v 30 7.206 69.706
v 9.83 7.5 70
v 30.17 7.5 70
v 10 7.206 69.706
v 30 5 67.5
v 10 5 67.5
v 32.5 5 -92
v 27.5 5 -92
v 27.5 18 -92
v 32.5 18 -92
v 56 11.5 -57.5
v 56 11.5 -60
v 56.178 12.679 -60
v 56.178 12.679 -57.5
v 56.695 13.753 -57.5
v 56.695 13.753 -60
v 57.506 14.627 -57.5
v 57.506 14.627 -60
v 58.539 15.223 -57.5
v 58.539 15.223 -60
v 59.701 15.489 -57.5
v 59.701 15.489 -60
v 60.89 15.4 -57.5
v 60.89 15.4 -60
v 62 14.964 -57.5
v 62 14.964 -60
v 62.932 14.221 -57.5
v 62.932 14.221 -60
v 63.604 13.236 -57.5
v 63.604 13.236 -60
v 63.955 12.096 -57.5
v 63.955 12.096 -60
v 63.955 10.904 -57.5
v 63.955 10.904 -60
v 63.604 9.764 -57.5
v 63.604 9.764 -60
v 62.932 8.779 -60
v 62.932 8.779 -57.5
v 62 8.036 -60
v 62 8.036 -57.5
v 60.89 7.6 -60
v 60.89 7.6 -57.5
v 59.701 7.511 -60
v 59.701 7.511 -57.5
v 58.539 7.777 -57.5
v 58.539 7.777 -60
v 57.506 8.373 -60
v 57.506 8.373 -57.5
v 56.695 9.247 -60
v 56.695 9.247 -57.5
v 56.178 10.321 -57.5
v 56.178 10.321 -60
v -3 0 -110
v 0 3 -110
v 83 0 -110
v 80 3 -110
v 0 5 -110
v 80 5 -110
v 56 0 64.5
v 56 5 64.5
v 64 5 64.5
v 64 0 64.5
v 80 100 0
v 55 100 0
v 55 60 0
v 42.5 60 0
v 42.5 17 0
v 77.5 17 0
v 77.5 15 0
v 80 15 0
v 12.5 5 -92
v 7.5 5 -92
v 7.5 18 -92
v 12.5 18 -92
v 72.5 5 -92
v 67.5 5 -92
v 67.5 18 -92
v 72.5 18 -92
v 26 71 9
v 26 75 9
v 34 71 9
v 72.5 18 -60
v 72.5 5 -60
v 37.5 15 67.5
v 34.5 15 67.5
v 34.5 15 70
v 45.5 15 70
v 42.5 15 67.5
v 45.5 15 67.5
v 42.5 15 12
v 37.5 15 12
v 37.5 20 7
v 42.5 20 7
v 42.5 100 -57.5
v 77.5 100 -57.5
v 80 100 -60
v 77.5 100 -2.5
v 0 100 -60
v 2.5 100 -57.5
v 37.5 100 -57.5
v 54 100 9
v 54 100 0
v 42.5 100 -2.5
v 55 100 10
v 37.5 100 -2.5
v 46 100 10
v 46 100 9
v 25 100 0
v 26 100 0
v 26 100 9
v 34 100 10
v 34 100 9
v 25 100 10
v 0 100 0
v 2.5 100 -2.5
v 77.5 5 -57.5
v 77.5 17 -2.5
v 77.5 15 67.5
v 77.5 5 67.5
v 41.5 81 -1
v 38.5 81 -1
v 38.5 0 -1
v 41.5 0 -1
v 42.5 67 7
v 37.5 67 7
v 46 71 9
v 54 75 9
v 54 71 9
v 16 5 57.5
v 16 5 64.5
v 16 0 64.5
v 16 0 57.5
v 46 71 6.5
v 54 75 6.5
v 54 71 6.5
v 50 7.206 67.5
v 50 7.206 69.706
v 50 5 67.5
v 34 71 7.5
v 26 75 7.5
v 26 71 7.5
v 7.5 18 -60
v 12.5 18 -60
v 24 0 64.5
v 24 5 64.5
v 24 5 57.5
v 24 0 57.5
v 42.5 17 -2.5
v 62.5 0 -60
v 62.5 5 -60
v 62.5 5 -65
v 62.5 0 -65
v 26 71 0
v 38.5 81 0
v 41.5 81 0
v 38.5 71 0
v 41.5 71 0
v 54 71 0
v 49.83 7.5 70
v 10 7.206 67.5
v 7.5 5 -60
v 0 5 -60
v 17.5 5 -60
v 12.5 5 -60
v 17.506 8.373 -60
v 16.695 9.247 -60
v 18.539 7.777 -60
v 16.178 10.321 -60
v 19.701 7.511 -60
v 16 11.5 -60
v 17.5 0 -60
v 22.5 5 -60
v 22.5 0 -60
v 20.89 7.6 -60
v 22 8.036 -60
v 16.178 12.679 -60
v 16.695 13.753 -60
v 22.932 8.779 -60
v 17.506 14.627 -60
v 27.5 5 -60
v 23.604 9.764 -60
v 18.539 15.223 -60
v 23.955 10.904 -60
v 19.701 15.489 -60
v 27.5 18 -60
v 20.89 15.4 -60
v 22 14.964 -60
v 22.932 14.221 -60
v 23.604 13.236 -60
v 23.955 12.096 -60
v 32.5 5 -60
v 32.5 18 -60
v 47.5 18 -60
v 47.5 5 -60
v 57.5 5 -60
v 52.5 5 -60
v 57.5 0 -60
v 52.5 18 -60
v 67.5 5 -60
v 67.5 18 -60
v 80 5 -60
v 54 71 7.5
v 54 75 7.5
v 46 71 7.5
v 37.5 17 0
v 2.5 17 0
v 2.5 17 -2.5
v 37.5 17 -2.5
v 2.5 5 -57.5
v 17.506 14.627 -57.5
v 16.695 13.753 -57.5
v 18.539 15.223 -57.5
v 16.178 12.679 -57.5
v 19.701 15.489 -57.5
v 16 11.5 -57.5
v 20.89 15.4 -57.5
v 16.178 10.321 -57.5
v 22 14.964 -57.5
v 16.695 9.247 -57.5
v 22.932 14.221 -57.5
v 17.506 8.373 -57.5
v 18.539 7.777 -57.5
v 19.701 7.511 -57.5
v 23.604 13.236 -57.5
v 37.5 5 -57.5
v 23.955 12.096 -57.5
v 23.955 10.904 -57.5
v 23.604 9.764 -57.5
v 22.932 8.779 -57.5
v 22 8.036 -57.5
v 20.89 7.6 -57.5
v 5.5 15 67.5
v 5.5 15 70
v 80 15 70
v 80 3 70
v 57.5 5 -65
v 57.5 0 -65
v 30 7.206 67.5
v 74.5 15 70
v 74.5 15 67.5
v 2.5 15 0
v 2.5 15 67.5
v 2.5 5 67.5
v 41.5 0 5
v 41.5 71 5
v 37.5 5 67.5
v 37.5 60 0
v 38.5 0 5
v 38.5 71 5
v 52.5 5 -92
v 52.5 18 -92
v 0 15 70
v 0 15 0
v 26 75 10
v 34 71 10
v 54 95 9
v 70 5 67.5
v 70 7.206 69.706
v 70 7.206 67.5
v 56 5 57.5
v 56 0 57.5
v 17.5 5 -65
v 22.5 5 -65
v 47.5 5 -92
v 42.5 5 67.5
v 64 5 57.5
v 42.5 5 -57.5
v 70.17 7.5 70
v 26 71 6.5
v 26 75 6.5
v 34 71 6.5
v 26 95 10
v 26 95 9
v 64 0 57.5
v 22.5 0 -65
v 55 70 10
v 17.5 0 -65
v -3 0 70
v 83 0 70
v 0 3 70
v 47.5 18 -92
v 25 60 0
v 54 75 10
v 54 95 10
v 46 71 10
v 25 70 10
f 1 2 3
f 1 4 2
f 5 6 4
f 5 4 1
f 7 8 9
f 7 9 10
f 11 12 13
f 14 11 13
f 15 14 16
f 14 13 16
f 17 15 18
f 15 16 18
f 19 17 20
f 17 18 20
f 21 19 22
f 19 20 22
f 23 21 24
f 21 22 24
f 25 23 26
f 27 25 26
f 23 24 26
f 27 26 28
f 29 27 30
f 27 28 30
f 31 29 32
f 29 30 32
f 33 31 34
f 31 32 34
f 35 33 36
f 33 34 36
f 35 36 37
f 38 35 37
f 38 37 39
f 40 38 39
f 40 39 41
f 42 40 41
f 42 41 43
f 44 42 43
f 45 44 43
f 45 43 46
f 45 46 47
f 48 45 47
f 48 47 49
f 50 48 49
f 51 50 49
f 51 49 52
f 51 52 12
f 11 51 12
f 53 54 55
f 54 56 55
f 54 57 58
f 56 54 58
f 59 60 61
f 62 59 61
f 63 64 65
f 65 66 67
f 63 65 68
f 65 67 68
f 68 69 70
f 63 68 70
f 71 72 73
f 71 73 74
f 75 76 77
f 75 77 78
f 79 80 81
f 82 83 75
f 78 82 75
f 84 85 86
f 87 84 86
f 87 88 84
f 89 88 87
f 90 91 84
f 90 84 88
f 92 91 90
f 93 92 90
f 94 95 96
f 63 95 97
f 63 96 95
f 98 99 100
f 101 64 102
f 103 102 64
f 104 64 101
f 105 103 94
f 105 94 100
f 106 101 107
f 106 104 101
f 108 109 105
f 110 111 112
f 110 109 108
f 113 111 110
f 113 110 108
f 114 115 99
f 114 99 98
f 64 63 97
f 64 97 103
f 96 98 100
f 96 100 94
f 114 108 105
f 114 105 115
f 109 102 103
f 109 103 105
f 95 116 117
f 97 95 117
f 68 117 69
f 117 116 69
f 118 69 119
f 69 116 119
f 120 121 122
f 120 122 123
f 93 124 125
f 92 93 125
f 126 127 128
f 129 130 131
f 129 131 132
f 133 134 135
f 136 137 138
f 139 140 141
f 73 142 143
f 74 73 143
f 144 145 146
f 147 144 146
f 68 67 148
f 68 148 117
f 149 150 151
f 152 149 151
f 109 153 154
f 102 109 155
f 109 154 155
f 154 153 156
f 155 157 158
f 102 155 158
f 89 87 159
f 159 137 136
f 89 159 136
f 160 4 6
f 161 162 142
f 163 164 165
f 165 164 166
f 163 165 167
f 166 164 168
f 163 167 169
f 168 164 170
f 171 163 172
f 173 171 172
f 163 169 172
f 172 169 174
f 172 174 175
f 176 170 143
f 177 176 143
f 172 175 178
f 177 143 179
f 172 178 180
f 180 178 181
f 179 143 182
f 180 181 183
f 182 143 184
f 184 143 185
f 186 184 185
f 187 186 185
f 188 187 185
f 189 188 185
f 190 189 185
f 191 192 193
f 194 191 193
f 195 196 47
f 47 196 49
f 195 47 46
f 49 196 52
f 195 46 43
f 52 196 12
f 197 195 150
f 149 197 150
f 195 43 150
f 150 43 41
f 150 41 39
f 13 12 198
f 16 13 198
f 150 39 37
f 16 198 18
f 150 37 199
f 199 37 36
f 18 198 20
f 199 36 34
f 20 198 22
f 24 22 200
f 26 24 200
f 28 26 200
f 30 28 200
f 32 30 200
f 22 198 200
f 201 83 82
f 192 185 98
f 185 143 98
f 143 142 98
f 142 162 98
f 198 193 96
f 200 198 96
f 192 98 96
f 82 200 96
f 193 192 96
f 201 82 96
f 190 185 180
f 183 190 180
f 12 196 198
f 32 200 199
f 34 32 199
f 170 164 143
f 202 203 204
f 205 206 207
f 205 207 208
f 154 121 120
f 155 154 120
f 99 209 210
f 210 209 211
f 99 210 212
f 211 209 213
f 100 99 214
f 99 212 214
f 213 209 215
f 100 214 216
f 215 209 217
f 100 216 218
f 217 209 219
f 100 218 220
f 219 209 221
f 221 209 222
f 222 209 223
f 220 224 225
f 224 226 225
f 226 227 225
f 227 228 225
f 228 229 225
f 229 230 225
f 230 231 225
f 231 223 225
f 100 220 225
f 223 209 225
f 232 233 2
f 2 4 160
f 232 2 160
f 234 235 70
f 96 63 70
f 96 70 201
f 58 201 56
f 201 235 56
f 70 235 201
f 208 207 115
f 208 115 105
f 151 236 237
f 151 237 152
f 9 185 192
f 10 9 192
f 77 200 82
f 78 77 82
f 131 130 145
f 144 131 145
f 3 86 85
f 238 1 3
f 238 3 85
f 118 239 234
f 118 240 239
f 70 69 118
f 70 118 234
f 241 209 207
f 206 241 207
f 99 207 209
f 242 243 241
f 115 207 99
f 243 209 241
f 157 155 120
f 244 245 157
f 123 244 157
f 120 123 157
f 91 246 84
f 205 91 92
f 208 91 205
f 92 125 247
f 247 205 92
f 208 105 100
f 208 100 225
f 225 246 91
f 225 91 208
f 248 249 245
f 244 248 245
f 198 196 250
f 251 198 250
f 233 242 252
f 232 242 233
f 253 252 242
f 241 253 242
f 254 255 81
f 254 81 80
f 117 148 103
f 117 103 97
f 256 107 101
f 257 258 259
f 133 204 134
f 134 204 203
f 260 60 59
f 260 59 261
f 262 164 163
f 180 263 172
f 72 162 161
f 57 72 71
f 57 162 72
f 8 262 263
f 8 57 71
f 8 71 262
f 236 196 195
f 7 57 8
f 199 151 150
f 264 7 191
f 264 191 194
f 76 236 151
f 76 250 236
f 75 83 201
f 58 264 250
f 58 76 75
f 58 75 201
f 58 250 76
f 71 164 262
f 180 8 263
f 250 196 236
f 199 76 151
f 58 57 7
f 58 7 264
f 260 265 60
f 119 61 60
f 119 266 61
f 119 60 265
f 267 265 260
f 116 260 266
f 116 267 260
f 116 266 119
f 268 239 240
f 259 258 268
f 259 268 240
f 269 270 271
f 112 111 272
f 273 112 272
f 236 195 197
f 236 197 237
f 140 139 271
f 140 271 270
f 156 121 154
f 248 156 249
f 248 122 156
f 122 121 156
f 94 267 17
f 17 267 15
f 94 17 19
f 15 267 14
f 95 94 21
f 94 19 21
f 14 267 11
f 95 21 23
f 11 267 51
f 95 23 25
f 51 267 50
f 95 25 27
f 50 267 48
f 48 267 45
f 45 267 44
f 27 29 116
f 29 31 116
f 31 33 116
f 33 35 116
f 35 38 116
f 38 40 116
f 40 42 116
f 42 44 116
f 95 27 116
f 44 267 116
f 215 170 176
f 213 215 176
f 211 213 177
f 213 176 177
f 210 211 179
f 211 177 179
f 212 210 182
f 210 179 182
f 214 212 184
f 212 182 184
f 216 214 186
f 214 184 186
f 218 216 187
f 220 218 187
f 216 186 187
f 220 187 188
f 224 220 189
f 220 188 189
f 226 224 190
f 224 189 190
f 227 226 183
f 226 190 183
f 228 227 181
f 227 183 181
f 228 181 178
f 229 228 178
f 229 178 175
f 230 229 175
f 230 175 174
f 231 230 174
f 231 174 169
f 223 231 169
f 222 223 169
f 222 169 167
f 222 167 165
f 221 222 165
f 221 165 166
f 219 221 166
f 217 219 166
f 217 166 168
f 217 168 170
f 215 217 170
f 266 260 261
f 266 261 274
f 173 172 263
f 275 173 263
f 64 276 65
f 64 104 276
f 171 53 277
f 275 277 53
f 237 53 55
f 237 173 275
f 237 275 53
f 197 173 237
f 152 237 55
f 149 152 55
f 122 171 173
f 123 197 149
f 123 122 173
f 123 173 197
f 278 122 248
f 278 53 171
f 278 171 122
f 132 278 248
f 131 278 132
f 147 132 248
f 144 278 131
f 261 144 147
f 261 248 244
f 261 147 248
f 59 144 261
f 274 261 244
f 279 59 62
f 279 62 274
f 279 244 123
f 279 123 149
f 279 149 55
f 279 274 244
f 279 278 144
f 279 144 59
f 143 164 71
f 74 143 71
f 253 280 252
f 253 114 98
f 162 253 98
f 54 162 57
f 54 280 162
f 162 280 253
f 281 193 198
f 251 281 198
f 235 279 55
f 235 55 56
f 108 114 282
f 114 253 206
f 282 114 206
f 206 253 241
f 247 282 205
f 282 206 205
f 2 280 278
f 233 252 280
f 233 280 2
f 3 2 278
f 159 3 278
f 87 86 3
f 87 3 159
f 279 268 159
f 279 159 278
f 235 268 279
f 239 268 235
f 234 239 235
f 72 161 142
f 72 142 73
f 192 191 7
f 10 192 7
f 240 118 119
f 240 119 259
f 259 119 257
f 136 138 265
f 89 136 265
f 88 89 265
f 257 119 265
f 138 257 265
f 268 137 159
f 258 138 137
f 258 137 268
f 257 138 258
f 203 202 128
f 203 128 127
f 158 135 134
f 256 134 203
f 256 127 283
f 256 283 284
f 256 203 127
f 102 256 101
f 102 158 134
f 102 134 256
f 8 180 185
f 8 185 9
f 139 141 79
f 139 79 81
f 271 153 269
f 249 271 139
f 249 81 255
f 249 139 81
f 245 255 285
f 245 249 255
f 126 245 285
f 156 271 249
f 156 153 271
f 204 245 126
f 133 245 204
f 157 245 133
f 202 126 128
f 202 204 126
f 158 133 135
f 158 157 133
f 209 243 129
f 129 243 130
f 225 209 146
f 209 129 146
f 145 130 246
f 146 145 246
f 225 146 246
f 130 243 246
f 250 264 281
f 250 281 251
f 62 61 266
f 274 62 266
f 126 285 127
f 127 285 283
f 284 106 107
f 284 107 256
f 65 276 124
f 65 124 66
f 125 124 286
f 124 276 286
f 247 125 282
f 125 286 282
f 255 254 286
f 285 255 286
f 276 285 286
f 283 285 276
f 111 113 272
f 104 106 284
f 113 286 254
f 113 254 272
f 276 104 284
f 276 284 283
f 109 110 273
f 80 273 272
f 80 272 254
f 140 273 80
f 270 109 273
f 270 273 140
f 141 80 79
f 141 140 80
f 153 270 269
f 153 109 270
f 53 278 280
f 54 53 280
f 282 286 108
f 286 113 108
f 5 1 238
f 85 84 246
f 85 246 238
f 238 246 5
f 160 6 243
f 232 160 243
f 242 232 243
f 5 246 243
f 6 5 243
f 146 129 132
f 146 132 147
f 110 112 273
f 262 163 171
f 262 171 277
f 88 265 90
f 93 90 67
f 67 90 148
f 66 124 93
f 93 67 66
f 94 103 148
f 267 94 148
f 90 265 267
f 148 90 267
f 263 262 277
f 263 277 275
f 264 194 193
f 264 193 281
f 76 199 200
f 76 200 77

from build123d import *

# Parameters (mm, degrees)
SKETCH1_W                                 = 80
SKETCH1_H                                 = 60
BOSS_EXTRUDE1_DEPTH                       = 100
CUT_EXTRUDE1_START                        = 5
SKETCH2_W                                 = 35
SKETCH2_H                                 = 55
CUT_EXTRUDE1_DEPTH                        = 95
SKETCH3_W                                 = 80
SKETCH3_H                                 = 5
BOSS_EXTRUDE2_DEPTH                       = 70
BOSS_EXTRUDE3_DEPTH                       = 10
SKETCH5_W                                 = 20
SKETCH5_H                                 = 2.5
CUT_EXTRUDE2_DEPTH                        = 7.5
SKETCH6_W                                 = 35
SKETCH6_H                                 = 12
CUT_EXTRUDE4_DEPTH                        = 57.5
CUT_EXTRUDE6_REACH                        = 184.483
SKETCH7_R                                 = 4
SKETCH9_W                                 = 80
SKETCH9_H                                 = 50
BOSS_EXTRUDE4_DEPTH                       = 5
SKETCH13_W                                = 8
SKETCH13_H                                = 7
CUT_EXTRUDE8_BUTTON_HOLES_DEPTH           = 166.90660023
BOSS_EXTRUDE5_OLED_MOUNT_DEPTH            = 10
BOSS_EXTRUDE6_OLED_MOUNT_DEPTH            = 1
BOSS_EXTRUDE7_START                       = -2.5
BOSS_EXTRUDE7_OLED_MOUNT_DEPTH            = 1
BOSS_EXTRUDE8_OLED_MOUNT_DEPTH            = 1
BOSS_EXTRUDE13_OLED_MOUNT_SUPPORT_DEPTH   = 30
CUT_EXTRUDE9_OLED_CABLE_DEPTH             = 10
CUT_EXTRUDE9_OLED_CABLE_DEPTH_BACK        = 154.430766146
SKETCH18_W                                = 3
SKETCH18_H                                = 6
BOSS_EXTRUDE12_OLED_CABLE_GUIDE_REACH     = 162.39
SKETCH20_W                                = 5
SKETCH20_H                                = 5
CUT_EXTRUDE10_SOLENOID_WIRE_HOLE_DEPTH    = 166.90660023
SKETCH21_W                                = 5
SKETCH21_H                                = 32
BOSS_EXTRUDE9_SOLENOID_SIDE_SUPPORT_DEPTH = 13
CHAMFER3_THUMB_SIZE                       = 2.5
CHAMFER5_THUMB_SIZE                       = 4.5
CHAMFER5_THUMB_SIZE2                      = 7.794228634
CHAMFER5_THUMB_PART_2_SIZE                = 4.5
CHAMFER5_THUMB_PART_2_SIZE2               = 7.794228634
CHAMFER5_THUMB_PART_3_SIZE                = 4.5
CHAMFER5_THUMB_PART_3_SIZE2               = 7.794228634
BOSS_EXTRUDE5_GUIDE_DEPTH                 = 180
SKETCH49_W                                = 5
SKETCH49_H                                = 5
BOSS_EXTRUDE14_DEPTH                      = 5
CHAMFER8_SIZE                             = 5


with BuildPart() as part:
    # Sketch1 → Boss-Extrude1 (new body)
    with BuildSketch(Plane(origin=(0, 0, 0), x_dir=(1, 0, 0), z_dir=(0, 1, 0))):
        with Locations((40, 30)):
            Rectangle(SKETCH1_W, SKETCH1_H)
    extrude(amount=BOSS_EXTRUDE1_DEPTH)

    # Sketch2 → Cut-Extrude1 (cut)
    with BuildSketch(Plane(origin=(0, 0, 0), x_dir=(1, 0, 0), z_dir=(0, 1, 0)).offset(CUT_EXTRUDE1_START)):
        with Locations((20, 30)):
            Rectangle(SKETCH2_W, SKETCH2_H)
        with Locations((60, 30)):
            Rectangle(SKETCH2_W, SKETCH2_H)
    extrude(amount=CUT_EXTRUDE1_DEPTH, mode=Mode.SUBTRACT)

    # Sketch3 → Boss-Extrude2 (add)
    with BuildSketch(Plane.XY):
        with Locations((40, 2.5)):
            Rectangle(SKETCH3_W, SKETCH3_H)
    extrude(amount=BOSS_EXTRUDE2_DEPTH)

    # Sketch4 → Boss-Extrude3 (add)
    with BuildSketch(Plane(origin=(0, 5, 0), x_dir=(1, 0, 0), z_dir=(0, 1, 0))):
        Polygon((80, 0), (77.5, 0), (77.5, -67.5), (42.5, -67.5), (42.5, 0), (37.5, 0), (37.5, -67.5), (2.5, -67.5), (2.5, 0), (0, 0), (0, -70), (80, -70), align=None)
    extrude(amount=BOSS_EXTRUDE3_DEPTH)

    # Sketch5 → Cut-Extrude2 (cut)
    with BuildSketch(Plane(origin=(0, 15, 0), x_dir=(1, 0, 0), z_dir=(0, 1, 0))):
        with Locations((20, -68.75)):
            Rectangle(SKETCH5_W, SKETCH5_H)
        with Locations((60, -68.75)):
            Rectangle(SKETCH5_W, SKETCH5_H)
    extrude(amount=-CUT_EXTRUDE2_DEPTH, mode=Mode.SUBTRACT)

    # Sketch6 → Cut-Extrude4 (cut)
    with BuildSketch(Plane.XY):
        with Locations((20, 11)):
            Rectangle(SKETCH6_W, SKETCH6_H)
        with Locations((60, 11)):
            Rectangle(SKETCH6_W, SKETCH6_H)
    extrude(amount=-CUT_EXTRUDE4_DEPTH, mode=Mode.SUBTRACT)

    # Sketch7 → Cut-Extrude6 (cut, up to next)
    with BuildSketch(Plane(origin=(0, 0, -60), x_dir=(-1, 0, 0), z_dir=(0, 0, -1)), mode=Mode.PRIVATE) as cut_extrude6_sk1:
        with Locations((-20, 11.5)):
            Circle(SKETCH7_R)
    cut_extrude6_tool1 = extrude(cut_extrude6_sk1.sketch, amount=-CUT_EXTRUDE6_REACH, mode=Mode.PRIVATE) & part.part
    # Sketch7 → Cut-Extrude6 (cut, up to next)
    with BuildSketch(Plane(origin=(0, 0, -60), x_dir=(-1, 0, 0), z_dir=(0, 0, -1)), mode=Mode.PRIVATE) as cut_extrude6_sk2:
        with Locations((-60, 11.5)):
            Circle(SKETCH7_R)
    cut_extrude6_tool2 = extrude(cut_extrude6_sk2.sketch, amount=-CUT_EXTRUDE6_REACH, mode=Mode.PRIVATE) & part.part
    add(cut_extrude6_tool1.solids().sort_by_distance((20, 11.5, -60))[0], mode=Mode.SUBTRACT)
    add(cut_extrude6_tool2.solids().sort_by_distance((60, 11.5, -60))[0], mode=Mode.SUBTRACT)

    # Sketch9 → Boss-Extrude4 (add)
    with BuildSketch(Plane(origin=(0, 0, 0), x_dir=(1, 0, 0), z_dir=(0, 1, 0))):
        with Locations((40, 85)):
            Rectangle(SKETCH9_W, SKETCH9_H)
    extrude(amount=BOSS_EXTRUDE4_DEPTH)

    # Sketch13 → Cut-Extrude8 (Button Holes) (cut, through all)
    with BuildSketch(Plane(origin=(0, 5, 0), x_dir=(1, 0, 0), z_dir=(0, 1, 0))):
        with Locations((20, -61)):
            Rectangle(SKETCH13_W, SKETCH13_H)
        with Locations((60, -61)):
            Rectangle(SKETCH13_W, SKETCH13_H)
    extrude(amount=-CUT_EXTRUDE8_BUTTON_HOLES_DEPTH, mode=Mode.SUBTRACT)

    # Sketch14 → Boss-Extrude5 (OLED Mount) (add)
    with BuildSketch(Plane.XY):
        Polygon((25, 100), (26, 100), (26, 71), (54, 71), (54, 100), (55, 100), (55, 70), (54, 70), (26, 70), (25, 70), align=None)
    extrude(amount=BOSS_EXTRUDE5_OLED_MOUNT_DEPTH)

    # Sketch15 → Boss-Extrude6 (OLED Mount) (add)
    with BuildSketch(Plane.XY.offset(10)):
        Polygon((26, 71), (34, 71), (26, 75), align=None)
        Polygon((54, 75), (54, 71), (46, 71), align=None)
    extrude(amount=-BOSS_EXTRUDE6_OLED_MOUNT_DEPTH)

    # Sketch15<2> → Boss-Extrude7 (OLED Mount) (add)
    with BuildSketch(Plane.XY.offset(10).offset(BOSS_EXTRUDE7_START)):
        Polygon((26, 71), (34, 71), (26, 75), align=None)
        Polygon((54, 75), (54, 71), (46, 71), align=None)
    extrude(amount=-BOSS_EXTRUDE7_OLED_MOUNT_DEPTH)

    # Sketch17 → Boss-Extrude8 (OLED Mount) (add)
    with BuildSketch(Plane.XY.offset(10)):
        Polygon((54, 95), (54, 100), (46, 100), align=None)
        Polygon((26, 100), (34, 100), (26, 95), align=None)
    extrude(amount=-BOSS_EXTRUDE8_OLED_MOUNT_DEPTH)

    # Sketch32 → Boss-Extrude13 OLED Mount Support) (add)
    with BuildSketch(Plane.ZY.offset(-25)):
        Polygon((0, 70), (10, 70), (0, 60), align=None)
    extrude(amount=-BOSS_EXTRUDE13_OLED_MOUNT_SUPPORT_DEPTH)

    # Sketch18 → Cut-Extrude9 (OLED Cable) (cut, two sides: drawn at the far end of the back side and taken through both)
    with BuildSketch(Plane(origin=(0, 71, 0), x_dir=(1, 0, 0), z_dir=(0, 1, 0)).offset(-CUT_EXTRUDE9_OLED_CABLE_DEPTH_BACK)):
        with Locations((40, -2)):
            Rectangle(SKETCH18_W, SKETCH18_H)
    extrude(amount=CUT_EXTRUDE9_OLED_CABLE_DEPTH + CUT_EXTRUDE9_OLED_CABLE_DEPTH_BACK, mode=Mode.SUBTRACT)

    # Boss-Extrude12 (OLED Cable Guide): up to this plane
    boss_extrude12_oled_cable_guide_end = Plane(origin=(55, 70, 10), z_dir=(0, -0.7071067811865477, 0.7071067811865474))
    # Sketch31 → Boss-Extrude12 (OLED Cable Guide) (add, up to the surface)
    with BuildSketch(Plane(origin=(0, 15, 0), x_dir=(1, 0, 0), z_dir=(0, 1, 0)), mode=Mode.PRIVATE) as boss_extrude12_oled_cable_guide_sk1:
        Polygon((37.5, 0), (38.5, 0), (38.5, -5), (41.5, -5), (41.5, 0), (42.5, 0), (42.5, -7), (37.5, -7), align=None)
    boss_extrude12_oled_cable_guide_tool1 = split(extrude(boss_extrude12_oled_cable_guide_sk1.sketch, amount=BOSS_EXTRUDE12_OLED_CABLE_GUIDE_REACH, mode=Mode.PRIVATE), bisect_by=boss_extrude12_oled_cable_guide_end, keep=Keep.BOTH, mode=Mode.PRIVATE)
    add(boss_extrude12_oled_cable_guide_tool1.solids().sort_by_distance((38, 15, 0.086023))[0])

    # Sketch20 → Cut-Extrude10 (Solenoid Wire Hole) (cut, through all)
    with BuildSketch(Plane(origin=(0, 5, 0), x_dir=(1, 0, 0), z_dir=(0, 1, 0))):
        with Locations((60, 62.5)):
            Rectangle(SKETCH20_W, SKETCH20_H)
        with Locations((20, 62.5)):
            Rectangle(SKETCH20_W, SKETCH20_H)
    extrude(amount=-CUT_EXTRUDE10_SOLENOID_WIRE_HOLE_DEPTH, mode=Mode.SUBTRACT)

    # Sketch21 → Boss-Extrude9 (Solenoid Side Support) (add)
    with BuildSketch(Plane(origin=(0, 5, 0), x_dir=(1, 0, 0), z_dir=(0, 1, 0))):
        with Locations((70, 76)):
            Rectangle(SKETCH21_W, SKETCH21_H)
        with Locations((50, 76)):
            Rectangle(SKETCH21_W, SKETCH21_H)
        with Locations((30, 76)):
            Rectangle(SKETCH21_W, SKETCH21_H)
        with Locations((10, 76)):
            Rectangle(SKETCH21_W, SKETCH21_H)
    extrude(amount=BOSS_EXTRUDE9_SOLENOID_SIDE_SUPPORT_DEPTH)

    # Chamfer3 (Thumb)
    chamfer3_thumb_edges = [part.edges().sort_by_distance(p)[0] for p in [
        (20, 7.5, 67.5),
        (60, 7.5, 67.5),
    ]]
    chamfer(chamfer3_thumb_edges, length=CHAMFER3_THUMB_SIZE - 0.0001)  # a hair under: the kernel refuses the full size

    # Chamfer5 (Thumb)
    chamfer5_thumb_edges = [part.edges().sort_by_distance(p)[0] for p in [
        (70, 15, 68.75),
    ]]
    chamfer5_thumb_side = [part.faces().sort_by_distance(p)[0] for p in [
        (78.266129032, 15, 38.266129032),
    ]]
    chamfer(chamfer5_thumb_edges, length=CHAMFER5_THUMB_SIZE, length2=CHAMFER5_THUMB_SIZE2, reference=chamfer5_thumb_side[0])

    # Chamfer5 (Thumb) part 2
    chamfer5_thumb_part_2_edges = [part.edges().sort_by_distance(p)[0] for p in [
        (50, 15, 68.75),
        (30, 15, 68.75),
    ]]
    chamfer5_thumb_part_2_side = [part.faces().sort_by_distance(p)[0] for p in [
        (40, 15, 41.718085106),
    ]]
    chamfer(chamfer5_thumb_part_2_edges, length=CHAMFER5_THUMB_PART_2_SIZE, length2=CHAMFER5_THUMB_PART_2_SIZE2, reference=chamfer5_thumb_part_2_side[0])

    # Chamfer5 (Thumb) part 3
    chamfer5_thumb_part_3_edges = [part.edges().sort_by_distance(p)[0] for p in [
        (10, 15, 68.75),
    ]]
    chamfer5_thumb_part_3_side = [part.faces().sort_by_distance(p)[0] for p in [
        (1.733870968, 15, 38.266129032),
    ]]
    chamfer(chamfer5_thumb_part_3_edges, length=CHAMFER5_THUMB_PART_3_SIZE, length2=CHAMFER5_THUMB_PART_3_SIZE2, reference=chamfer5_thumb_part_3_side[0])

    # Sketch37 → Boss-Extrude5 (Guide) (add, through all)
    with BuildSketch(Plane.XY.offset(70)):
        Polygon((80, 0), (83, 0), (80, 3), align=None)
        Polygon((0, 0), (-3, 0), (0, 3), align=None)
    extrude(amount=-BOSS_EXTRUDE5_GUIDE_DEPTH)

    # Sketch49 → Boss-Extrude14 (add)
    with BuildSketch(Plane(origin=(0, 15, 0), x_dir=(1, 0, 0), z_dir=(0, 1, 0))):
        with Locations((40, -9.5)):
            Rectangle(SKETCH49_W, SKETCH49_H)
    extrude(amount=BOSS_EXTRUDE14_DEPTH)

    # Chamfer8
    chamfer8_edges = [part.edges().sort_by_distance(p)[0] for p in [
        (40, 20, 12),
    ]]
    chamfer(chamfer8_edges, length=CHAMFER8_SIZE - 0.0001)  # a hair under: the kernel refuses the full size


solid = part.part
